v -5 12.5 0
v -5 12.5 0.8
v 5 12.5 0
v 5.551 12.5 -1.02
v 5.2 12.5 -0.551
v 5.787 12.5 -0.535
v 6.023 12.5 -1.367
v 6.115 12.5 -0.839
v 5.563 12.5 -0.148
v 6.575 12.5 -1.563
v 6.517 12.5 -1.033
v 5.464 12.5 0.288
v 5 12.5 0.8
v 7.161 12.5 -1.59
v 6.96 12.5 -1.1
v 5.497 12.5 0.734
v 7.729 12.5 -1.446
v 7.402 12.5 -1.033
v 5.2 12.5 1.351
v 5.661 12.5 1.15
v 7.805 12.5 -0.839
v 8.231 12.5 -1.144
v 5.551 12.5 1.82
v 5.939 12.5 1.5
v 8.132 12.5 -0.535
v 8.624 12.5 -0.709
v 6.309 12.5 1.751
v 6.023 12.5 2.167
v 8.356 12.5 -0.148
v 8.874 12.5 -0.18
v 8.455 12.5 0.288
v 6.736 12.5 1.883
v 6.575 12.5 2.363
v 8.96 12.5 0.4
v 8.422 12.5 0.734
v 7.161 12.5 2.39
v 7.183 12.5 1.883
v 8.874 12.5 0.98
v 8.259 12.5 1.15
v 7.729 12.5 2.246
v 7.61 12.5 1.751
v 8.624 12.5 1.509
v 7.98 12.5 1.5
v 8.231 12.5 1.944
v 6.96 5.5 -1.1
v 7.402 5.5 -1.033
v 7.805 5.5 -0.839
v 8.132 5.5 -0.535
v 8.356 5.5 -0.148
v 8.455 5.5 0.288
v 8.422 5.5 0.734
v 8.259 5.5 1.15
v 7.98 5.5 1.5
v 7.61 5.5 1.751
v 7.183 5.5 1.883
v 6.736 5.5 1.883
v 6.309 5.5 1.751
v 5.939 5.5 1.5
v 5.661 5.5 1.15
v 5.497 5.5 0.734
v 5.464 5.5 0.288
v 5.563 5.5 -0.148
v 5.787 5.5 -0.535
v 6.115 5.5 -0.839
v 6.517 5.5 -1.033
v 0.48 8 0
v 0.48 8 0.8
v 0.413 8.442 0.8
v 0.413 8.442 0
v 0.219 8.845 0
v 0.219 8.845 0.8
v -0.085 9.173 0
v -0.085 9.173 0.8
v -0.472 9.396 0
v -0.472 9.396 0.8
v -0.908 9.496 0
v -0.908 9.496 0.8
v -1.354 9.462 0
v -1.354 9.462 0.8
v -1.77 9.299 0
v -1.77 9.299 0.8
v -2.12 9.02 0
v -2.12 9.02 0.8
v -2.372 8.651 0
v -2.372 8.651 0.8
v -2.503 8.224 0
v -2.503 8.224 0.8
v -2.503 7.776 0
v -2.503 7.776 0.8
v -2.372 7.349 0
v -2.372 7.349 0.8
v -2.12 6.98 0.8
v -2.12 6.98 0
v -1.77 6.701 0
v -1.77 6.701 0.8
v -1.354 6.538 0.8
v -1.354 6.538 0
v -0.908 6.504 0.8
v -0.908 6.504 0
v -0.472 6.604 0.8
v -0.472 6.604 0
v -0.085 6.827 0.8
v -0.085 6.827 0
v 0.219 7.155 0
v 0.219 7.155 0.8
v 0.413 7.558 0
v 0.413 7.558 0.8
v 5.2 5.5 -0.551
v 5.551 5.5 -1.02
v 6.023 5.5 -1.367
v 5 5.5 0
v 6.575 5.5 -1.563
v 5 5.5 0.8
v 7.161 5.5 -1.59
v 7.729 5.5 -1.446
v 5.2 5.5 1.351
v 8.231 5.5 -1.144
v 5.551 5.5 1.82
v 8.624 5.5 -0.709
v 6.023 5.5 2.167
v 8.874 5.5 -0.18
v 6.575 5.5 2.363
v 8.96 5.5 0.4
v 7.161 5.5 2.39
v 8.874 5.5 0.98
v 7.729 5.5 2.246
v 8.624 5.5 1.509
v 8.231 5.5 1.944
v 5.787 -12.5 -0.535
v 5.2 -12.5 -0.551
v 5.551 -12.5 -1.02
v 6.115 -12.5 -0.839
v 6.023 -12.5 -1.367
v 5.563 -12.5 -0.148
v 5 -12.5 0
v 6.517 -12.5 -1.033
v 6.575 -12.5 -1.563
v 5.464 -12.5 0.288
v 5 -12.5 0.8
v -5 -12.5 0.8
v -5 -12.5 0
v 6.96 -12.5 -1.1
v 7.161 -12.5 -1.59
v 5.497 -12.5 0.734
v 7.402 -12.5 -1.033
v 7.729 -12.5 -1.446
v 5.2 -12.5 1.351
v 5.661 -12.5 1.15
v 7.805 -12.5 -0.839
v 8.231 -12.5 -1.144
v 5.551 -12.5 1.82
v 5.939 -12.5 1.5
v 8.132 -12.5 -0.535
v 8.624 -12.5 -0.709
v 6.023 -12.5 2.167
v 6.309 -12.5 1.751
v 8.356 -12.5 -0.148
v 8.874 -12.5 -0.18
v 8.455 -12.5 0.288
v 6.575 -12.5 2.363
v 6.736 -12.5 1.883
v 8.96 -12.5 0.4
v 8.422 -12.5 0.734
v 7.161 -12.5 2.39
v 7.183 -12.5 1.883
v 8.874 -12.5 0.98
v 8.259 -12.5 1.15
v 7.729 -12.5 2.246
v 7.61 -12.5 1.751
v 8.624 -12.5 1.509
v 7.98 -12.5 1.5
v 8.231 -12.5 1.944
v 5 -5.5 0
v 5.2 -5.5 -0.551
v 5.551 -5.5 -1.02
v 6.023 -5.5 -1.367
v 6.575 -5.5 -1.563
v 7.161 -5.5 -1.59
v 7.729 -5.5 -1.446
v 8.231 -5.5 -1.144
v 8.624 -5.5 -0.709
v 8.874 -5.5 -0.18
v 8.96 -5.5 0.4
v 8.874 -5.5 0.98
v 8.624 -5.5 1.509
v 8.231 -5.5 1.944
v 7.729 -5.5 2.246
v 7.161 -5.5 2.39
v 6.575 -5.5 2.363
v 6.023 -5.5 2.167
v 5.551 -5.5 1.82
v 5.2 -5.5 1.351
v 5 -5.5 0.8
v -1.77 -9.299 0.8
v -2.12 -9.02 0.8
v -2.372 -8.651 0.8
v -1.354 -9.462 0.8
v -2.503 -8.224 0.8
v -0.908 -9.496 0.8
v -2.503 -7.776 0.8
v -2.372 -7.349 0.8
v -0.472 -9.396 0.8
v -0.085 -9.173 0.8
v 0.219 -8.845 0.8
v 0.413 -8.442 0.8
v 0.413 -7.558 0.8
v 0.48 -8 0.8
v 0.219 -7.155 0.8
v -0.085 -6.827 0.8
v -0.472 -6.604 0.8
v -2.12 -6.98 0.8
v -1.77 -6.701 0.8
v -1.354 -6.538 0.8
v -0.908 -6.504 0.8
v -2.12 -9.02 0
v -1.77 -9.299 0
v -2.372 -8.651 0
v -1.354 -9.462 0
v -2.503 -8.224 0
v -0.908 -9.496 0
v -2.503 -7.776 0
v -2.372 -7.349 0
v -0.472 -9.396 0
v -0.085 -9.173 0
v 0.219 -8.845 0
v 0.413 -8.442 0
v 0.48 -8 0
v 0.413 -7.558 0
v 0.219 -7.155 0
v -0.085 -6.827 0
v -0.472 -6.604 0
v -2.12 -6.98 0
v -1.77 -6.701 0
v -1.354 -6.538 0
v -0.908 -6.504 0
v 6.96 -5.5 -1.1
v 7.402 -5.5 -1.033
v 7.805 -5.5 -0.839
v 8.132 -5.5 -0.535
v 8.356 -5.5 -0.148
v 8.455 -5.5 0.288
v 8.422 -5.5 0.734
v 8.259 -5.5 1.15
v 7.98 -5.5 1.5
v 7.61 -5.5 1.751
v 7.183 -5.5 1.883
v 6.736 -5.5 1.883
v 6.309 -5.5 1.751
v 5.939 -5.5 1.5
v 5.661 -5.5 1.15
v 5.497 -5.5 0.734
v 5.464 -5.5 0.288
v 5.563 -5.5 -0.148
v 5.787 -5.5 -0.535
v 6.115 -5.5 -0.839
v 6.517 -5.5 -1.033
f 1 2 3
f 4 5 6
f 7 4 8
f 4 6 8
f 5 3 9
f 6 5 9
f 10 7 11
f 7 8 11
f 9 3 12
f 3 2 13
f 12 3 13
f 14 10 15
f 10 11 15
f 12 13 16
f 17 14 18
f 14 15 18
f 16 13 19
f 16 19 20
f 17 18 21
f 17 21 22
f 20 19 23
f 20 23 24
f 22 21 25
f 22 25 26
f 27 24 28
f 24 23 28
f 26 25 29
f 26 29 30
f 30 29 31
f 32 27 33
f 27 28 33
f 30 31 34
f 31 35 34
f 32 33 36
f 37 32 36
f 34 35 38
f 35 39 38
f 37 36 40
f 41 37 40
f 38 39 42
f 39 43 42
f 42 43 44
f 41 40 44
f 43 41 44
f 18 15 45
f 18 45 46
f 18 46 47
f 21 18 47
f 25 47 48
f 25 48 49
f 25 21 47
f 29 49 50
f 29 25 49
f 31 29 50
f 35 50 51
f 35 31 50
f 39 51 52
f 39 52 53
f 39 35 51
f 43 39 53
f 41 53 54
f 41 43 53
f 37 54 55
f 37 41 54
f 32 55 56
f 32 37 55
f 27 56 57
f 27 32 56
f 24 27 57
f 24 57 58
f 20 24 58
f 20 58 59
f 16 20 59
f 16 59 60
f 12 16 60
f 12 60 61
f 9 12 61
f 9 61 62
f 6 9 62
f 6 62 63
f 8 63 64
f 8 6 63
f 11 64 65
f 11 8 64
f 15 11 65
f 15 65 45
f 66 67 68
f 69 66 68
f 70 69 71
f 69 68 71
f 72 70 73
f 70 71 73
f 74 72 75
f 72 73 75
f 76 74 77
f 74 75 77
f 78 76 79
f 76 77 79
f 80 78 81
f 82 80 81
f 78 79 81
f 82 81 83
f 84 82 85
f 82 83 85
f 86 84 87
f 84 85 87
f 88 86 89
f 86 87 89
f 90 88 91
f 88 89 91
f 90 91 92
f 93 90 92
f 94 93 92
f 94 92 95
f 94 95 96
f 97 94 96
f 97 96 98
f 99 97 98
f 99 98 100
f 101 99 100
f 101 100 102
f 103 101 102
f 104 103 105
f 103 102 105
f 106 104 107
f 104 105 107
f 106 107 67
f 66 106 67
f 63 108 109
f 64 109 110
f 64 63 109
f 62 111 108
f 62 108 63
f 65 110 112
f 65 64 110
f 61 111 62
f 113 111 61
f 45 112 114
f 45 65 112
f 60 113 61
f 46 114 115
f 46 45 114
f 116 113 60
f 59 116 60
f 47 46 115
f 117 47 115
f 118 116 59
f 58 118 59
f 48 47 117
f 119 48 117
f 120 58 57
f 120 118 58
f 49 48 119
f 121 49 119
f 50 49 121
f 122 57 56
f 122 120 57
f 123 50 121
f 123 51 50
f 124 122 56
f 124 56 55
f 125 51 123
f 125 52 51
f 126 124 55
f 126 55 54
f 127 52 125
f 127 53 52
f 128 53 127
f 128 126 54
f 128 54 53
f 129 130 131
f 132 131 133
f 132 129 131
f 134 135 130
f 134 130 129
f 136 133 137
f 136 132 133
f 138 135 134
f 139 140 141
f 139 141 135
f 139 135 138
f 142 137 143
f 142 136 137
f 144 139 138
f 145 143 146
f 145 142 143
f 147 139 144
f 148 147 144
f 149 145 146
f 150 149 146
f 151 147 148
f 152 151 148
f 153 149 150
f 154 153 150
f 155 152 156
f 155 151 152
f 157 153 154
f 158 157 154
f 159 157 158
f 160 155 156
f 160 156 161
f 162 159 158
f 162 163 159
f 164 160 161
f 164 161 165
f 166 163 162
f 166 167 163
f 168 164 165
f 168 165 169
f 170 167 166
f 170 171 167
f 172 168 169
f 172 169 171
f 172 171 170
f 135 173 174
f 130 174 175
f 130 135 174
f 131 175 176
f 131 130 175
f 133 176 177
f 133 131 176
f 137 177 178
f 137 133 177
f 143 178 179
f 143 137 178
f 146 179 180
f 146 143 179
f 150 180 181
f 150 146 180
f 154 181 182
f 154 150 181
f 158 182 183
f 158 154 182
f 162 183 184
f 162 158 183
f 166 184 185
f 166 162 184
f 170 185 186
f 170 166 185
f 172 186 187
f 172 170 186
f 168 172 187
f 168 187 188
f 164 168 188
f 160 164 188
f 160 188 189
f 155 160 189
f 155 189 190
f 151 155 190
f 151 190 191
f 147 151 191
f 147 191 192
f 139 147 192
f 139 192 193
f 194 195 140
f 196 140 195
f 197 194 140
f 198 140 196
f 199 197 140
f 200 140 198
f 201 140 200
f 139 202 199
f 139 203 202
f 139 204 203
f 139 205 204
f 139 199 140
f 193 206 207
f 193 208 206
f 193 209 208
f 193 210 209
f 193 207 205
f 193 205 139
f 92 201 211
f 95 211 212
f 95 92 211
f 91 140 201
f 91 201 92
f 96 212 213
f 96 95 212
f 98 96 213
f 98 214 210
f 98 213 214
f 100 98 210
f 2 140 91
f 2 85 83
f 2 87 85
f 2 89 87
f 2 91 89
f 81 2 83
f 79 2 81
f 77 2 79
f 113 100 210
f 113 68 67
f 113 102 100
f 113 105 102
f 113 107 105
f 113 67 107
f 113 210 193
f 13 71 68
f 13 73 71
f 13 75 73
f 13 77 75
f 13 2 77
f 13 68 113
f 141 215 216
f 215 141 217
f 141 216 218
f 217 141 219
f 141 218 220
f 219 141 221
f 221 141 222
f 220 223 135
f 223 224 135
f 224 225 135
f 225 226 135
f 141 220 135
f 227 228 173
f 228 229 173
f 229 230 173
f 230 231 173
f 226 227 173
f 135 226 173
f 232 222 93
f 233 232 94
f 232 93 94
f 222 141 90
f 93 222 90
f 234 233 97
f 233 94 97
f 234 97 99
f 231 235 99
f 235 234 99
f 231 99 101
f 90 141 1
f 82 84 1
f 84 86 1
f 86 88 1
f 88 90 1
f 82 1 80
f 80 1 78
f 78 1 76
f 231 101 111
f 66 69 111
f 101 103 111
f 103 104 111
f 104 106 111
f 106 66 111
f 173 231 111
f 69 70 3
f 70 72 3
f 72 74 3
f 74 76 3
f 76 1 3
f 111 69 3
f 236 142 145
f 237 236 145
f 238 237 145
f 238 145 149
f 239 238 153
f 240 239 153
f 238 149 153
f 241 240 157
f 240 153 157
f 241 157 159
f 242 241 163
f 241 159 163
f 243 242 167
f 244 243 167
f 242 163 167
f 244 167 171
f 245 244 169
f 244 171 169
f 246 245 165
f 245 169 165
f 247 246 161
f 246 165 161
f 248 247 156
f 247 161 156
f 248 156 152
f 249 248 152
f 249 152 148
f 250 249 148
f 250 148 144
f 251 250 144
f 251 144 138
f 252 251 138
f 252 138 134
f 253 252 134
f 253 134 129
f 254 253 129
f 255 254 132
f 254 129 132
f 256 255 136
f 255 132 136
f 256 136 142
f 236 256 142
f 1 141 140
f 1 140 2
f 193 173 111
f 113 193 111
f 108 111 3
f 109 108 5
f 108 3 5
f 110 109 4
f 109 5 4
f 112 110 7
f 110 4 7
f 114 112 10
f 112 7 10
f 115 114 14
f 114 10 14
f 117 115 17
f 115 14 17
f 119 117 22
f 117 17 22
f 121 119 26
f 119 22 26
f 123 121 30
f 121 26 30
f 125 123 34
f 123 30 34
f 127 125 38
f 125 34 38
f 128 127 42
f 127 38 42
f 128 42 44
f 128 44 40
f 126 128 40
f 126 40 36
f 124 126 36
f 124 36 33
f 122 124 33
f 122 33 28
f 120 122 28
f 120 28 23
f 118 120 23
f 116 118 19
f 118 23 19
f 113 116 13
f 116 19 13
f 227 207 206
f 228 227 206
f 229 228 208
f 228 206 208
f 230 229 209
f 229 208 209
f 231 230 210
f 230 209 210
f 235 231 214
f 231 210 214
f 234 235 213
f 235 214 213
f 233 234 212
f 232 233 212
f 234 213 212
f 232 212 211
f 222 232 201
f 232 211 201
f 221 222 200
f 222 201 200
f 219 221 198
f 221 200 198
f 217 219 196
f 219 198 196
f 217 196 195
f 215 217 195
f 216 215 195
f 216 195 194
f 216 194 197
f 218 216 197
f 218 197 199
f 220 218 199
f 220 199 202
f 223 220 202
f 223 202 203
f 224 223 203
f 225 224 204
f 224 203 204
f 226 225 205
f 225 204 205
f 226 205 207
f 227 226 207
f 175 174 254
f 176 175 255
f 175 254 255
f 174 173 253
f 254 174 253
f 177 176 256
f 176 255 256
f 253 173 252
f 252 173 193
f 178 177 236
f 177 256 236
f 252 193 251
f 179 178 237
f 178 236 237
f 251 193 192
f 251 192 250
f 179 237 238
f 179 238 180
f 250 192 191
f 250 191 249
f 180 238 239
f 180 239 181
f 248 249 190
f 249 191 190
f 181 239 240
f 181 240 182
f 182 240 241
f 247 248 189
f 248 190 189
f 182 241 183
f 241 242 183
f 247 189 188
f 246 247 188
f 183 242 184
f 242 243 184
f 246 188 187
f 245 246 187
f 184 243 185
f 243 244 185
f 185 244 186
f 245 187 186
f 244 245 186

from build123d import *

# Parameters (mm, degrees)
SKETCH_1_W          = 10
SKETCH_1_H          = 25
EXTRUDE_1_DEPTH     = 0.8
SKETCH_2_R          = 2
SKETCH_2_R_2        = 1.5
EXTRUDE_2_DEPTH     = 7
SKETCH_3_R          = 1.5
CUT_EXTRUDE_1_DEPTH = 0.8


with BuildPart() as part:
    # 草图1 → 凸台-拉伸1 (new body)
    with BuildSketch(Plane.XY):
        Rectangle(SKETCH_1_W, SKETCH_1_H)
    extrude(amount=EXTRUDE_1_DEPTH)

    # 草图2 → 凸台-拉伸2 (add)
    with BuildSketch(Plane.XZ.offset(12.5)):
        with Locations((6.959591794, 0.4)):
            Circle(SKETCH_2_R)
        with Locations(Location((6.959591794, 0.4, 0), (0, 0, 270))):
            Circle(SKETCH_2_R_2, mode=Mode.SUBTRACT)
    extrude_2 = extrude(amount=-EXTRUDE_2_DEPTH)

    # 镜向1: 凸台-拉伸2 across plane
    add(extrude_2.mirror(Plane.ZX))

    # 草图3 → 切除-拉伸1 (cut)
    with BuildSketch(Plane.XY.offset(0.8)):
        with Locations((-1.020204103, 8)):
            Circle(SKETCH_3_R)
        with Locations((-1.020204103, -8)):
            Circle(SKETCH_3_R)
    extrude(amount=-CUT_EXTRUDE_1_DEPTH, mode=Mode.SUBTRACT)


solid = part.part
